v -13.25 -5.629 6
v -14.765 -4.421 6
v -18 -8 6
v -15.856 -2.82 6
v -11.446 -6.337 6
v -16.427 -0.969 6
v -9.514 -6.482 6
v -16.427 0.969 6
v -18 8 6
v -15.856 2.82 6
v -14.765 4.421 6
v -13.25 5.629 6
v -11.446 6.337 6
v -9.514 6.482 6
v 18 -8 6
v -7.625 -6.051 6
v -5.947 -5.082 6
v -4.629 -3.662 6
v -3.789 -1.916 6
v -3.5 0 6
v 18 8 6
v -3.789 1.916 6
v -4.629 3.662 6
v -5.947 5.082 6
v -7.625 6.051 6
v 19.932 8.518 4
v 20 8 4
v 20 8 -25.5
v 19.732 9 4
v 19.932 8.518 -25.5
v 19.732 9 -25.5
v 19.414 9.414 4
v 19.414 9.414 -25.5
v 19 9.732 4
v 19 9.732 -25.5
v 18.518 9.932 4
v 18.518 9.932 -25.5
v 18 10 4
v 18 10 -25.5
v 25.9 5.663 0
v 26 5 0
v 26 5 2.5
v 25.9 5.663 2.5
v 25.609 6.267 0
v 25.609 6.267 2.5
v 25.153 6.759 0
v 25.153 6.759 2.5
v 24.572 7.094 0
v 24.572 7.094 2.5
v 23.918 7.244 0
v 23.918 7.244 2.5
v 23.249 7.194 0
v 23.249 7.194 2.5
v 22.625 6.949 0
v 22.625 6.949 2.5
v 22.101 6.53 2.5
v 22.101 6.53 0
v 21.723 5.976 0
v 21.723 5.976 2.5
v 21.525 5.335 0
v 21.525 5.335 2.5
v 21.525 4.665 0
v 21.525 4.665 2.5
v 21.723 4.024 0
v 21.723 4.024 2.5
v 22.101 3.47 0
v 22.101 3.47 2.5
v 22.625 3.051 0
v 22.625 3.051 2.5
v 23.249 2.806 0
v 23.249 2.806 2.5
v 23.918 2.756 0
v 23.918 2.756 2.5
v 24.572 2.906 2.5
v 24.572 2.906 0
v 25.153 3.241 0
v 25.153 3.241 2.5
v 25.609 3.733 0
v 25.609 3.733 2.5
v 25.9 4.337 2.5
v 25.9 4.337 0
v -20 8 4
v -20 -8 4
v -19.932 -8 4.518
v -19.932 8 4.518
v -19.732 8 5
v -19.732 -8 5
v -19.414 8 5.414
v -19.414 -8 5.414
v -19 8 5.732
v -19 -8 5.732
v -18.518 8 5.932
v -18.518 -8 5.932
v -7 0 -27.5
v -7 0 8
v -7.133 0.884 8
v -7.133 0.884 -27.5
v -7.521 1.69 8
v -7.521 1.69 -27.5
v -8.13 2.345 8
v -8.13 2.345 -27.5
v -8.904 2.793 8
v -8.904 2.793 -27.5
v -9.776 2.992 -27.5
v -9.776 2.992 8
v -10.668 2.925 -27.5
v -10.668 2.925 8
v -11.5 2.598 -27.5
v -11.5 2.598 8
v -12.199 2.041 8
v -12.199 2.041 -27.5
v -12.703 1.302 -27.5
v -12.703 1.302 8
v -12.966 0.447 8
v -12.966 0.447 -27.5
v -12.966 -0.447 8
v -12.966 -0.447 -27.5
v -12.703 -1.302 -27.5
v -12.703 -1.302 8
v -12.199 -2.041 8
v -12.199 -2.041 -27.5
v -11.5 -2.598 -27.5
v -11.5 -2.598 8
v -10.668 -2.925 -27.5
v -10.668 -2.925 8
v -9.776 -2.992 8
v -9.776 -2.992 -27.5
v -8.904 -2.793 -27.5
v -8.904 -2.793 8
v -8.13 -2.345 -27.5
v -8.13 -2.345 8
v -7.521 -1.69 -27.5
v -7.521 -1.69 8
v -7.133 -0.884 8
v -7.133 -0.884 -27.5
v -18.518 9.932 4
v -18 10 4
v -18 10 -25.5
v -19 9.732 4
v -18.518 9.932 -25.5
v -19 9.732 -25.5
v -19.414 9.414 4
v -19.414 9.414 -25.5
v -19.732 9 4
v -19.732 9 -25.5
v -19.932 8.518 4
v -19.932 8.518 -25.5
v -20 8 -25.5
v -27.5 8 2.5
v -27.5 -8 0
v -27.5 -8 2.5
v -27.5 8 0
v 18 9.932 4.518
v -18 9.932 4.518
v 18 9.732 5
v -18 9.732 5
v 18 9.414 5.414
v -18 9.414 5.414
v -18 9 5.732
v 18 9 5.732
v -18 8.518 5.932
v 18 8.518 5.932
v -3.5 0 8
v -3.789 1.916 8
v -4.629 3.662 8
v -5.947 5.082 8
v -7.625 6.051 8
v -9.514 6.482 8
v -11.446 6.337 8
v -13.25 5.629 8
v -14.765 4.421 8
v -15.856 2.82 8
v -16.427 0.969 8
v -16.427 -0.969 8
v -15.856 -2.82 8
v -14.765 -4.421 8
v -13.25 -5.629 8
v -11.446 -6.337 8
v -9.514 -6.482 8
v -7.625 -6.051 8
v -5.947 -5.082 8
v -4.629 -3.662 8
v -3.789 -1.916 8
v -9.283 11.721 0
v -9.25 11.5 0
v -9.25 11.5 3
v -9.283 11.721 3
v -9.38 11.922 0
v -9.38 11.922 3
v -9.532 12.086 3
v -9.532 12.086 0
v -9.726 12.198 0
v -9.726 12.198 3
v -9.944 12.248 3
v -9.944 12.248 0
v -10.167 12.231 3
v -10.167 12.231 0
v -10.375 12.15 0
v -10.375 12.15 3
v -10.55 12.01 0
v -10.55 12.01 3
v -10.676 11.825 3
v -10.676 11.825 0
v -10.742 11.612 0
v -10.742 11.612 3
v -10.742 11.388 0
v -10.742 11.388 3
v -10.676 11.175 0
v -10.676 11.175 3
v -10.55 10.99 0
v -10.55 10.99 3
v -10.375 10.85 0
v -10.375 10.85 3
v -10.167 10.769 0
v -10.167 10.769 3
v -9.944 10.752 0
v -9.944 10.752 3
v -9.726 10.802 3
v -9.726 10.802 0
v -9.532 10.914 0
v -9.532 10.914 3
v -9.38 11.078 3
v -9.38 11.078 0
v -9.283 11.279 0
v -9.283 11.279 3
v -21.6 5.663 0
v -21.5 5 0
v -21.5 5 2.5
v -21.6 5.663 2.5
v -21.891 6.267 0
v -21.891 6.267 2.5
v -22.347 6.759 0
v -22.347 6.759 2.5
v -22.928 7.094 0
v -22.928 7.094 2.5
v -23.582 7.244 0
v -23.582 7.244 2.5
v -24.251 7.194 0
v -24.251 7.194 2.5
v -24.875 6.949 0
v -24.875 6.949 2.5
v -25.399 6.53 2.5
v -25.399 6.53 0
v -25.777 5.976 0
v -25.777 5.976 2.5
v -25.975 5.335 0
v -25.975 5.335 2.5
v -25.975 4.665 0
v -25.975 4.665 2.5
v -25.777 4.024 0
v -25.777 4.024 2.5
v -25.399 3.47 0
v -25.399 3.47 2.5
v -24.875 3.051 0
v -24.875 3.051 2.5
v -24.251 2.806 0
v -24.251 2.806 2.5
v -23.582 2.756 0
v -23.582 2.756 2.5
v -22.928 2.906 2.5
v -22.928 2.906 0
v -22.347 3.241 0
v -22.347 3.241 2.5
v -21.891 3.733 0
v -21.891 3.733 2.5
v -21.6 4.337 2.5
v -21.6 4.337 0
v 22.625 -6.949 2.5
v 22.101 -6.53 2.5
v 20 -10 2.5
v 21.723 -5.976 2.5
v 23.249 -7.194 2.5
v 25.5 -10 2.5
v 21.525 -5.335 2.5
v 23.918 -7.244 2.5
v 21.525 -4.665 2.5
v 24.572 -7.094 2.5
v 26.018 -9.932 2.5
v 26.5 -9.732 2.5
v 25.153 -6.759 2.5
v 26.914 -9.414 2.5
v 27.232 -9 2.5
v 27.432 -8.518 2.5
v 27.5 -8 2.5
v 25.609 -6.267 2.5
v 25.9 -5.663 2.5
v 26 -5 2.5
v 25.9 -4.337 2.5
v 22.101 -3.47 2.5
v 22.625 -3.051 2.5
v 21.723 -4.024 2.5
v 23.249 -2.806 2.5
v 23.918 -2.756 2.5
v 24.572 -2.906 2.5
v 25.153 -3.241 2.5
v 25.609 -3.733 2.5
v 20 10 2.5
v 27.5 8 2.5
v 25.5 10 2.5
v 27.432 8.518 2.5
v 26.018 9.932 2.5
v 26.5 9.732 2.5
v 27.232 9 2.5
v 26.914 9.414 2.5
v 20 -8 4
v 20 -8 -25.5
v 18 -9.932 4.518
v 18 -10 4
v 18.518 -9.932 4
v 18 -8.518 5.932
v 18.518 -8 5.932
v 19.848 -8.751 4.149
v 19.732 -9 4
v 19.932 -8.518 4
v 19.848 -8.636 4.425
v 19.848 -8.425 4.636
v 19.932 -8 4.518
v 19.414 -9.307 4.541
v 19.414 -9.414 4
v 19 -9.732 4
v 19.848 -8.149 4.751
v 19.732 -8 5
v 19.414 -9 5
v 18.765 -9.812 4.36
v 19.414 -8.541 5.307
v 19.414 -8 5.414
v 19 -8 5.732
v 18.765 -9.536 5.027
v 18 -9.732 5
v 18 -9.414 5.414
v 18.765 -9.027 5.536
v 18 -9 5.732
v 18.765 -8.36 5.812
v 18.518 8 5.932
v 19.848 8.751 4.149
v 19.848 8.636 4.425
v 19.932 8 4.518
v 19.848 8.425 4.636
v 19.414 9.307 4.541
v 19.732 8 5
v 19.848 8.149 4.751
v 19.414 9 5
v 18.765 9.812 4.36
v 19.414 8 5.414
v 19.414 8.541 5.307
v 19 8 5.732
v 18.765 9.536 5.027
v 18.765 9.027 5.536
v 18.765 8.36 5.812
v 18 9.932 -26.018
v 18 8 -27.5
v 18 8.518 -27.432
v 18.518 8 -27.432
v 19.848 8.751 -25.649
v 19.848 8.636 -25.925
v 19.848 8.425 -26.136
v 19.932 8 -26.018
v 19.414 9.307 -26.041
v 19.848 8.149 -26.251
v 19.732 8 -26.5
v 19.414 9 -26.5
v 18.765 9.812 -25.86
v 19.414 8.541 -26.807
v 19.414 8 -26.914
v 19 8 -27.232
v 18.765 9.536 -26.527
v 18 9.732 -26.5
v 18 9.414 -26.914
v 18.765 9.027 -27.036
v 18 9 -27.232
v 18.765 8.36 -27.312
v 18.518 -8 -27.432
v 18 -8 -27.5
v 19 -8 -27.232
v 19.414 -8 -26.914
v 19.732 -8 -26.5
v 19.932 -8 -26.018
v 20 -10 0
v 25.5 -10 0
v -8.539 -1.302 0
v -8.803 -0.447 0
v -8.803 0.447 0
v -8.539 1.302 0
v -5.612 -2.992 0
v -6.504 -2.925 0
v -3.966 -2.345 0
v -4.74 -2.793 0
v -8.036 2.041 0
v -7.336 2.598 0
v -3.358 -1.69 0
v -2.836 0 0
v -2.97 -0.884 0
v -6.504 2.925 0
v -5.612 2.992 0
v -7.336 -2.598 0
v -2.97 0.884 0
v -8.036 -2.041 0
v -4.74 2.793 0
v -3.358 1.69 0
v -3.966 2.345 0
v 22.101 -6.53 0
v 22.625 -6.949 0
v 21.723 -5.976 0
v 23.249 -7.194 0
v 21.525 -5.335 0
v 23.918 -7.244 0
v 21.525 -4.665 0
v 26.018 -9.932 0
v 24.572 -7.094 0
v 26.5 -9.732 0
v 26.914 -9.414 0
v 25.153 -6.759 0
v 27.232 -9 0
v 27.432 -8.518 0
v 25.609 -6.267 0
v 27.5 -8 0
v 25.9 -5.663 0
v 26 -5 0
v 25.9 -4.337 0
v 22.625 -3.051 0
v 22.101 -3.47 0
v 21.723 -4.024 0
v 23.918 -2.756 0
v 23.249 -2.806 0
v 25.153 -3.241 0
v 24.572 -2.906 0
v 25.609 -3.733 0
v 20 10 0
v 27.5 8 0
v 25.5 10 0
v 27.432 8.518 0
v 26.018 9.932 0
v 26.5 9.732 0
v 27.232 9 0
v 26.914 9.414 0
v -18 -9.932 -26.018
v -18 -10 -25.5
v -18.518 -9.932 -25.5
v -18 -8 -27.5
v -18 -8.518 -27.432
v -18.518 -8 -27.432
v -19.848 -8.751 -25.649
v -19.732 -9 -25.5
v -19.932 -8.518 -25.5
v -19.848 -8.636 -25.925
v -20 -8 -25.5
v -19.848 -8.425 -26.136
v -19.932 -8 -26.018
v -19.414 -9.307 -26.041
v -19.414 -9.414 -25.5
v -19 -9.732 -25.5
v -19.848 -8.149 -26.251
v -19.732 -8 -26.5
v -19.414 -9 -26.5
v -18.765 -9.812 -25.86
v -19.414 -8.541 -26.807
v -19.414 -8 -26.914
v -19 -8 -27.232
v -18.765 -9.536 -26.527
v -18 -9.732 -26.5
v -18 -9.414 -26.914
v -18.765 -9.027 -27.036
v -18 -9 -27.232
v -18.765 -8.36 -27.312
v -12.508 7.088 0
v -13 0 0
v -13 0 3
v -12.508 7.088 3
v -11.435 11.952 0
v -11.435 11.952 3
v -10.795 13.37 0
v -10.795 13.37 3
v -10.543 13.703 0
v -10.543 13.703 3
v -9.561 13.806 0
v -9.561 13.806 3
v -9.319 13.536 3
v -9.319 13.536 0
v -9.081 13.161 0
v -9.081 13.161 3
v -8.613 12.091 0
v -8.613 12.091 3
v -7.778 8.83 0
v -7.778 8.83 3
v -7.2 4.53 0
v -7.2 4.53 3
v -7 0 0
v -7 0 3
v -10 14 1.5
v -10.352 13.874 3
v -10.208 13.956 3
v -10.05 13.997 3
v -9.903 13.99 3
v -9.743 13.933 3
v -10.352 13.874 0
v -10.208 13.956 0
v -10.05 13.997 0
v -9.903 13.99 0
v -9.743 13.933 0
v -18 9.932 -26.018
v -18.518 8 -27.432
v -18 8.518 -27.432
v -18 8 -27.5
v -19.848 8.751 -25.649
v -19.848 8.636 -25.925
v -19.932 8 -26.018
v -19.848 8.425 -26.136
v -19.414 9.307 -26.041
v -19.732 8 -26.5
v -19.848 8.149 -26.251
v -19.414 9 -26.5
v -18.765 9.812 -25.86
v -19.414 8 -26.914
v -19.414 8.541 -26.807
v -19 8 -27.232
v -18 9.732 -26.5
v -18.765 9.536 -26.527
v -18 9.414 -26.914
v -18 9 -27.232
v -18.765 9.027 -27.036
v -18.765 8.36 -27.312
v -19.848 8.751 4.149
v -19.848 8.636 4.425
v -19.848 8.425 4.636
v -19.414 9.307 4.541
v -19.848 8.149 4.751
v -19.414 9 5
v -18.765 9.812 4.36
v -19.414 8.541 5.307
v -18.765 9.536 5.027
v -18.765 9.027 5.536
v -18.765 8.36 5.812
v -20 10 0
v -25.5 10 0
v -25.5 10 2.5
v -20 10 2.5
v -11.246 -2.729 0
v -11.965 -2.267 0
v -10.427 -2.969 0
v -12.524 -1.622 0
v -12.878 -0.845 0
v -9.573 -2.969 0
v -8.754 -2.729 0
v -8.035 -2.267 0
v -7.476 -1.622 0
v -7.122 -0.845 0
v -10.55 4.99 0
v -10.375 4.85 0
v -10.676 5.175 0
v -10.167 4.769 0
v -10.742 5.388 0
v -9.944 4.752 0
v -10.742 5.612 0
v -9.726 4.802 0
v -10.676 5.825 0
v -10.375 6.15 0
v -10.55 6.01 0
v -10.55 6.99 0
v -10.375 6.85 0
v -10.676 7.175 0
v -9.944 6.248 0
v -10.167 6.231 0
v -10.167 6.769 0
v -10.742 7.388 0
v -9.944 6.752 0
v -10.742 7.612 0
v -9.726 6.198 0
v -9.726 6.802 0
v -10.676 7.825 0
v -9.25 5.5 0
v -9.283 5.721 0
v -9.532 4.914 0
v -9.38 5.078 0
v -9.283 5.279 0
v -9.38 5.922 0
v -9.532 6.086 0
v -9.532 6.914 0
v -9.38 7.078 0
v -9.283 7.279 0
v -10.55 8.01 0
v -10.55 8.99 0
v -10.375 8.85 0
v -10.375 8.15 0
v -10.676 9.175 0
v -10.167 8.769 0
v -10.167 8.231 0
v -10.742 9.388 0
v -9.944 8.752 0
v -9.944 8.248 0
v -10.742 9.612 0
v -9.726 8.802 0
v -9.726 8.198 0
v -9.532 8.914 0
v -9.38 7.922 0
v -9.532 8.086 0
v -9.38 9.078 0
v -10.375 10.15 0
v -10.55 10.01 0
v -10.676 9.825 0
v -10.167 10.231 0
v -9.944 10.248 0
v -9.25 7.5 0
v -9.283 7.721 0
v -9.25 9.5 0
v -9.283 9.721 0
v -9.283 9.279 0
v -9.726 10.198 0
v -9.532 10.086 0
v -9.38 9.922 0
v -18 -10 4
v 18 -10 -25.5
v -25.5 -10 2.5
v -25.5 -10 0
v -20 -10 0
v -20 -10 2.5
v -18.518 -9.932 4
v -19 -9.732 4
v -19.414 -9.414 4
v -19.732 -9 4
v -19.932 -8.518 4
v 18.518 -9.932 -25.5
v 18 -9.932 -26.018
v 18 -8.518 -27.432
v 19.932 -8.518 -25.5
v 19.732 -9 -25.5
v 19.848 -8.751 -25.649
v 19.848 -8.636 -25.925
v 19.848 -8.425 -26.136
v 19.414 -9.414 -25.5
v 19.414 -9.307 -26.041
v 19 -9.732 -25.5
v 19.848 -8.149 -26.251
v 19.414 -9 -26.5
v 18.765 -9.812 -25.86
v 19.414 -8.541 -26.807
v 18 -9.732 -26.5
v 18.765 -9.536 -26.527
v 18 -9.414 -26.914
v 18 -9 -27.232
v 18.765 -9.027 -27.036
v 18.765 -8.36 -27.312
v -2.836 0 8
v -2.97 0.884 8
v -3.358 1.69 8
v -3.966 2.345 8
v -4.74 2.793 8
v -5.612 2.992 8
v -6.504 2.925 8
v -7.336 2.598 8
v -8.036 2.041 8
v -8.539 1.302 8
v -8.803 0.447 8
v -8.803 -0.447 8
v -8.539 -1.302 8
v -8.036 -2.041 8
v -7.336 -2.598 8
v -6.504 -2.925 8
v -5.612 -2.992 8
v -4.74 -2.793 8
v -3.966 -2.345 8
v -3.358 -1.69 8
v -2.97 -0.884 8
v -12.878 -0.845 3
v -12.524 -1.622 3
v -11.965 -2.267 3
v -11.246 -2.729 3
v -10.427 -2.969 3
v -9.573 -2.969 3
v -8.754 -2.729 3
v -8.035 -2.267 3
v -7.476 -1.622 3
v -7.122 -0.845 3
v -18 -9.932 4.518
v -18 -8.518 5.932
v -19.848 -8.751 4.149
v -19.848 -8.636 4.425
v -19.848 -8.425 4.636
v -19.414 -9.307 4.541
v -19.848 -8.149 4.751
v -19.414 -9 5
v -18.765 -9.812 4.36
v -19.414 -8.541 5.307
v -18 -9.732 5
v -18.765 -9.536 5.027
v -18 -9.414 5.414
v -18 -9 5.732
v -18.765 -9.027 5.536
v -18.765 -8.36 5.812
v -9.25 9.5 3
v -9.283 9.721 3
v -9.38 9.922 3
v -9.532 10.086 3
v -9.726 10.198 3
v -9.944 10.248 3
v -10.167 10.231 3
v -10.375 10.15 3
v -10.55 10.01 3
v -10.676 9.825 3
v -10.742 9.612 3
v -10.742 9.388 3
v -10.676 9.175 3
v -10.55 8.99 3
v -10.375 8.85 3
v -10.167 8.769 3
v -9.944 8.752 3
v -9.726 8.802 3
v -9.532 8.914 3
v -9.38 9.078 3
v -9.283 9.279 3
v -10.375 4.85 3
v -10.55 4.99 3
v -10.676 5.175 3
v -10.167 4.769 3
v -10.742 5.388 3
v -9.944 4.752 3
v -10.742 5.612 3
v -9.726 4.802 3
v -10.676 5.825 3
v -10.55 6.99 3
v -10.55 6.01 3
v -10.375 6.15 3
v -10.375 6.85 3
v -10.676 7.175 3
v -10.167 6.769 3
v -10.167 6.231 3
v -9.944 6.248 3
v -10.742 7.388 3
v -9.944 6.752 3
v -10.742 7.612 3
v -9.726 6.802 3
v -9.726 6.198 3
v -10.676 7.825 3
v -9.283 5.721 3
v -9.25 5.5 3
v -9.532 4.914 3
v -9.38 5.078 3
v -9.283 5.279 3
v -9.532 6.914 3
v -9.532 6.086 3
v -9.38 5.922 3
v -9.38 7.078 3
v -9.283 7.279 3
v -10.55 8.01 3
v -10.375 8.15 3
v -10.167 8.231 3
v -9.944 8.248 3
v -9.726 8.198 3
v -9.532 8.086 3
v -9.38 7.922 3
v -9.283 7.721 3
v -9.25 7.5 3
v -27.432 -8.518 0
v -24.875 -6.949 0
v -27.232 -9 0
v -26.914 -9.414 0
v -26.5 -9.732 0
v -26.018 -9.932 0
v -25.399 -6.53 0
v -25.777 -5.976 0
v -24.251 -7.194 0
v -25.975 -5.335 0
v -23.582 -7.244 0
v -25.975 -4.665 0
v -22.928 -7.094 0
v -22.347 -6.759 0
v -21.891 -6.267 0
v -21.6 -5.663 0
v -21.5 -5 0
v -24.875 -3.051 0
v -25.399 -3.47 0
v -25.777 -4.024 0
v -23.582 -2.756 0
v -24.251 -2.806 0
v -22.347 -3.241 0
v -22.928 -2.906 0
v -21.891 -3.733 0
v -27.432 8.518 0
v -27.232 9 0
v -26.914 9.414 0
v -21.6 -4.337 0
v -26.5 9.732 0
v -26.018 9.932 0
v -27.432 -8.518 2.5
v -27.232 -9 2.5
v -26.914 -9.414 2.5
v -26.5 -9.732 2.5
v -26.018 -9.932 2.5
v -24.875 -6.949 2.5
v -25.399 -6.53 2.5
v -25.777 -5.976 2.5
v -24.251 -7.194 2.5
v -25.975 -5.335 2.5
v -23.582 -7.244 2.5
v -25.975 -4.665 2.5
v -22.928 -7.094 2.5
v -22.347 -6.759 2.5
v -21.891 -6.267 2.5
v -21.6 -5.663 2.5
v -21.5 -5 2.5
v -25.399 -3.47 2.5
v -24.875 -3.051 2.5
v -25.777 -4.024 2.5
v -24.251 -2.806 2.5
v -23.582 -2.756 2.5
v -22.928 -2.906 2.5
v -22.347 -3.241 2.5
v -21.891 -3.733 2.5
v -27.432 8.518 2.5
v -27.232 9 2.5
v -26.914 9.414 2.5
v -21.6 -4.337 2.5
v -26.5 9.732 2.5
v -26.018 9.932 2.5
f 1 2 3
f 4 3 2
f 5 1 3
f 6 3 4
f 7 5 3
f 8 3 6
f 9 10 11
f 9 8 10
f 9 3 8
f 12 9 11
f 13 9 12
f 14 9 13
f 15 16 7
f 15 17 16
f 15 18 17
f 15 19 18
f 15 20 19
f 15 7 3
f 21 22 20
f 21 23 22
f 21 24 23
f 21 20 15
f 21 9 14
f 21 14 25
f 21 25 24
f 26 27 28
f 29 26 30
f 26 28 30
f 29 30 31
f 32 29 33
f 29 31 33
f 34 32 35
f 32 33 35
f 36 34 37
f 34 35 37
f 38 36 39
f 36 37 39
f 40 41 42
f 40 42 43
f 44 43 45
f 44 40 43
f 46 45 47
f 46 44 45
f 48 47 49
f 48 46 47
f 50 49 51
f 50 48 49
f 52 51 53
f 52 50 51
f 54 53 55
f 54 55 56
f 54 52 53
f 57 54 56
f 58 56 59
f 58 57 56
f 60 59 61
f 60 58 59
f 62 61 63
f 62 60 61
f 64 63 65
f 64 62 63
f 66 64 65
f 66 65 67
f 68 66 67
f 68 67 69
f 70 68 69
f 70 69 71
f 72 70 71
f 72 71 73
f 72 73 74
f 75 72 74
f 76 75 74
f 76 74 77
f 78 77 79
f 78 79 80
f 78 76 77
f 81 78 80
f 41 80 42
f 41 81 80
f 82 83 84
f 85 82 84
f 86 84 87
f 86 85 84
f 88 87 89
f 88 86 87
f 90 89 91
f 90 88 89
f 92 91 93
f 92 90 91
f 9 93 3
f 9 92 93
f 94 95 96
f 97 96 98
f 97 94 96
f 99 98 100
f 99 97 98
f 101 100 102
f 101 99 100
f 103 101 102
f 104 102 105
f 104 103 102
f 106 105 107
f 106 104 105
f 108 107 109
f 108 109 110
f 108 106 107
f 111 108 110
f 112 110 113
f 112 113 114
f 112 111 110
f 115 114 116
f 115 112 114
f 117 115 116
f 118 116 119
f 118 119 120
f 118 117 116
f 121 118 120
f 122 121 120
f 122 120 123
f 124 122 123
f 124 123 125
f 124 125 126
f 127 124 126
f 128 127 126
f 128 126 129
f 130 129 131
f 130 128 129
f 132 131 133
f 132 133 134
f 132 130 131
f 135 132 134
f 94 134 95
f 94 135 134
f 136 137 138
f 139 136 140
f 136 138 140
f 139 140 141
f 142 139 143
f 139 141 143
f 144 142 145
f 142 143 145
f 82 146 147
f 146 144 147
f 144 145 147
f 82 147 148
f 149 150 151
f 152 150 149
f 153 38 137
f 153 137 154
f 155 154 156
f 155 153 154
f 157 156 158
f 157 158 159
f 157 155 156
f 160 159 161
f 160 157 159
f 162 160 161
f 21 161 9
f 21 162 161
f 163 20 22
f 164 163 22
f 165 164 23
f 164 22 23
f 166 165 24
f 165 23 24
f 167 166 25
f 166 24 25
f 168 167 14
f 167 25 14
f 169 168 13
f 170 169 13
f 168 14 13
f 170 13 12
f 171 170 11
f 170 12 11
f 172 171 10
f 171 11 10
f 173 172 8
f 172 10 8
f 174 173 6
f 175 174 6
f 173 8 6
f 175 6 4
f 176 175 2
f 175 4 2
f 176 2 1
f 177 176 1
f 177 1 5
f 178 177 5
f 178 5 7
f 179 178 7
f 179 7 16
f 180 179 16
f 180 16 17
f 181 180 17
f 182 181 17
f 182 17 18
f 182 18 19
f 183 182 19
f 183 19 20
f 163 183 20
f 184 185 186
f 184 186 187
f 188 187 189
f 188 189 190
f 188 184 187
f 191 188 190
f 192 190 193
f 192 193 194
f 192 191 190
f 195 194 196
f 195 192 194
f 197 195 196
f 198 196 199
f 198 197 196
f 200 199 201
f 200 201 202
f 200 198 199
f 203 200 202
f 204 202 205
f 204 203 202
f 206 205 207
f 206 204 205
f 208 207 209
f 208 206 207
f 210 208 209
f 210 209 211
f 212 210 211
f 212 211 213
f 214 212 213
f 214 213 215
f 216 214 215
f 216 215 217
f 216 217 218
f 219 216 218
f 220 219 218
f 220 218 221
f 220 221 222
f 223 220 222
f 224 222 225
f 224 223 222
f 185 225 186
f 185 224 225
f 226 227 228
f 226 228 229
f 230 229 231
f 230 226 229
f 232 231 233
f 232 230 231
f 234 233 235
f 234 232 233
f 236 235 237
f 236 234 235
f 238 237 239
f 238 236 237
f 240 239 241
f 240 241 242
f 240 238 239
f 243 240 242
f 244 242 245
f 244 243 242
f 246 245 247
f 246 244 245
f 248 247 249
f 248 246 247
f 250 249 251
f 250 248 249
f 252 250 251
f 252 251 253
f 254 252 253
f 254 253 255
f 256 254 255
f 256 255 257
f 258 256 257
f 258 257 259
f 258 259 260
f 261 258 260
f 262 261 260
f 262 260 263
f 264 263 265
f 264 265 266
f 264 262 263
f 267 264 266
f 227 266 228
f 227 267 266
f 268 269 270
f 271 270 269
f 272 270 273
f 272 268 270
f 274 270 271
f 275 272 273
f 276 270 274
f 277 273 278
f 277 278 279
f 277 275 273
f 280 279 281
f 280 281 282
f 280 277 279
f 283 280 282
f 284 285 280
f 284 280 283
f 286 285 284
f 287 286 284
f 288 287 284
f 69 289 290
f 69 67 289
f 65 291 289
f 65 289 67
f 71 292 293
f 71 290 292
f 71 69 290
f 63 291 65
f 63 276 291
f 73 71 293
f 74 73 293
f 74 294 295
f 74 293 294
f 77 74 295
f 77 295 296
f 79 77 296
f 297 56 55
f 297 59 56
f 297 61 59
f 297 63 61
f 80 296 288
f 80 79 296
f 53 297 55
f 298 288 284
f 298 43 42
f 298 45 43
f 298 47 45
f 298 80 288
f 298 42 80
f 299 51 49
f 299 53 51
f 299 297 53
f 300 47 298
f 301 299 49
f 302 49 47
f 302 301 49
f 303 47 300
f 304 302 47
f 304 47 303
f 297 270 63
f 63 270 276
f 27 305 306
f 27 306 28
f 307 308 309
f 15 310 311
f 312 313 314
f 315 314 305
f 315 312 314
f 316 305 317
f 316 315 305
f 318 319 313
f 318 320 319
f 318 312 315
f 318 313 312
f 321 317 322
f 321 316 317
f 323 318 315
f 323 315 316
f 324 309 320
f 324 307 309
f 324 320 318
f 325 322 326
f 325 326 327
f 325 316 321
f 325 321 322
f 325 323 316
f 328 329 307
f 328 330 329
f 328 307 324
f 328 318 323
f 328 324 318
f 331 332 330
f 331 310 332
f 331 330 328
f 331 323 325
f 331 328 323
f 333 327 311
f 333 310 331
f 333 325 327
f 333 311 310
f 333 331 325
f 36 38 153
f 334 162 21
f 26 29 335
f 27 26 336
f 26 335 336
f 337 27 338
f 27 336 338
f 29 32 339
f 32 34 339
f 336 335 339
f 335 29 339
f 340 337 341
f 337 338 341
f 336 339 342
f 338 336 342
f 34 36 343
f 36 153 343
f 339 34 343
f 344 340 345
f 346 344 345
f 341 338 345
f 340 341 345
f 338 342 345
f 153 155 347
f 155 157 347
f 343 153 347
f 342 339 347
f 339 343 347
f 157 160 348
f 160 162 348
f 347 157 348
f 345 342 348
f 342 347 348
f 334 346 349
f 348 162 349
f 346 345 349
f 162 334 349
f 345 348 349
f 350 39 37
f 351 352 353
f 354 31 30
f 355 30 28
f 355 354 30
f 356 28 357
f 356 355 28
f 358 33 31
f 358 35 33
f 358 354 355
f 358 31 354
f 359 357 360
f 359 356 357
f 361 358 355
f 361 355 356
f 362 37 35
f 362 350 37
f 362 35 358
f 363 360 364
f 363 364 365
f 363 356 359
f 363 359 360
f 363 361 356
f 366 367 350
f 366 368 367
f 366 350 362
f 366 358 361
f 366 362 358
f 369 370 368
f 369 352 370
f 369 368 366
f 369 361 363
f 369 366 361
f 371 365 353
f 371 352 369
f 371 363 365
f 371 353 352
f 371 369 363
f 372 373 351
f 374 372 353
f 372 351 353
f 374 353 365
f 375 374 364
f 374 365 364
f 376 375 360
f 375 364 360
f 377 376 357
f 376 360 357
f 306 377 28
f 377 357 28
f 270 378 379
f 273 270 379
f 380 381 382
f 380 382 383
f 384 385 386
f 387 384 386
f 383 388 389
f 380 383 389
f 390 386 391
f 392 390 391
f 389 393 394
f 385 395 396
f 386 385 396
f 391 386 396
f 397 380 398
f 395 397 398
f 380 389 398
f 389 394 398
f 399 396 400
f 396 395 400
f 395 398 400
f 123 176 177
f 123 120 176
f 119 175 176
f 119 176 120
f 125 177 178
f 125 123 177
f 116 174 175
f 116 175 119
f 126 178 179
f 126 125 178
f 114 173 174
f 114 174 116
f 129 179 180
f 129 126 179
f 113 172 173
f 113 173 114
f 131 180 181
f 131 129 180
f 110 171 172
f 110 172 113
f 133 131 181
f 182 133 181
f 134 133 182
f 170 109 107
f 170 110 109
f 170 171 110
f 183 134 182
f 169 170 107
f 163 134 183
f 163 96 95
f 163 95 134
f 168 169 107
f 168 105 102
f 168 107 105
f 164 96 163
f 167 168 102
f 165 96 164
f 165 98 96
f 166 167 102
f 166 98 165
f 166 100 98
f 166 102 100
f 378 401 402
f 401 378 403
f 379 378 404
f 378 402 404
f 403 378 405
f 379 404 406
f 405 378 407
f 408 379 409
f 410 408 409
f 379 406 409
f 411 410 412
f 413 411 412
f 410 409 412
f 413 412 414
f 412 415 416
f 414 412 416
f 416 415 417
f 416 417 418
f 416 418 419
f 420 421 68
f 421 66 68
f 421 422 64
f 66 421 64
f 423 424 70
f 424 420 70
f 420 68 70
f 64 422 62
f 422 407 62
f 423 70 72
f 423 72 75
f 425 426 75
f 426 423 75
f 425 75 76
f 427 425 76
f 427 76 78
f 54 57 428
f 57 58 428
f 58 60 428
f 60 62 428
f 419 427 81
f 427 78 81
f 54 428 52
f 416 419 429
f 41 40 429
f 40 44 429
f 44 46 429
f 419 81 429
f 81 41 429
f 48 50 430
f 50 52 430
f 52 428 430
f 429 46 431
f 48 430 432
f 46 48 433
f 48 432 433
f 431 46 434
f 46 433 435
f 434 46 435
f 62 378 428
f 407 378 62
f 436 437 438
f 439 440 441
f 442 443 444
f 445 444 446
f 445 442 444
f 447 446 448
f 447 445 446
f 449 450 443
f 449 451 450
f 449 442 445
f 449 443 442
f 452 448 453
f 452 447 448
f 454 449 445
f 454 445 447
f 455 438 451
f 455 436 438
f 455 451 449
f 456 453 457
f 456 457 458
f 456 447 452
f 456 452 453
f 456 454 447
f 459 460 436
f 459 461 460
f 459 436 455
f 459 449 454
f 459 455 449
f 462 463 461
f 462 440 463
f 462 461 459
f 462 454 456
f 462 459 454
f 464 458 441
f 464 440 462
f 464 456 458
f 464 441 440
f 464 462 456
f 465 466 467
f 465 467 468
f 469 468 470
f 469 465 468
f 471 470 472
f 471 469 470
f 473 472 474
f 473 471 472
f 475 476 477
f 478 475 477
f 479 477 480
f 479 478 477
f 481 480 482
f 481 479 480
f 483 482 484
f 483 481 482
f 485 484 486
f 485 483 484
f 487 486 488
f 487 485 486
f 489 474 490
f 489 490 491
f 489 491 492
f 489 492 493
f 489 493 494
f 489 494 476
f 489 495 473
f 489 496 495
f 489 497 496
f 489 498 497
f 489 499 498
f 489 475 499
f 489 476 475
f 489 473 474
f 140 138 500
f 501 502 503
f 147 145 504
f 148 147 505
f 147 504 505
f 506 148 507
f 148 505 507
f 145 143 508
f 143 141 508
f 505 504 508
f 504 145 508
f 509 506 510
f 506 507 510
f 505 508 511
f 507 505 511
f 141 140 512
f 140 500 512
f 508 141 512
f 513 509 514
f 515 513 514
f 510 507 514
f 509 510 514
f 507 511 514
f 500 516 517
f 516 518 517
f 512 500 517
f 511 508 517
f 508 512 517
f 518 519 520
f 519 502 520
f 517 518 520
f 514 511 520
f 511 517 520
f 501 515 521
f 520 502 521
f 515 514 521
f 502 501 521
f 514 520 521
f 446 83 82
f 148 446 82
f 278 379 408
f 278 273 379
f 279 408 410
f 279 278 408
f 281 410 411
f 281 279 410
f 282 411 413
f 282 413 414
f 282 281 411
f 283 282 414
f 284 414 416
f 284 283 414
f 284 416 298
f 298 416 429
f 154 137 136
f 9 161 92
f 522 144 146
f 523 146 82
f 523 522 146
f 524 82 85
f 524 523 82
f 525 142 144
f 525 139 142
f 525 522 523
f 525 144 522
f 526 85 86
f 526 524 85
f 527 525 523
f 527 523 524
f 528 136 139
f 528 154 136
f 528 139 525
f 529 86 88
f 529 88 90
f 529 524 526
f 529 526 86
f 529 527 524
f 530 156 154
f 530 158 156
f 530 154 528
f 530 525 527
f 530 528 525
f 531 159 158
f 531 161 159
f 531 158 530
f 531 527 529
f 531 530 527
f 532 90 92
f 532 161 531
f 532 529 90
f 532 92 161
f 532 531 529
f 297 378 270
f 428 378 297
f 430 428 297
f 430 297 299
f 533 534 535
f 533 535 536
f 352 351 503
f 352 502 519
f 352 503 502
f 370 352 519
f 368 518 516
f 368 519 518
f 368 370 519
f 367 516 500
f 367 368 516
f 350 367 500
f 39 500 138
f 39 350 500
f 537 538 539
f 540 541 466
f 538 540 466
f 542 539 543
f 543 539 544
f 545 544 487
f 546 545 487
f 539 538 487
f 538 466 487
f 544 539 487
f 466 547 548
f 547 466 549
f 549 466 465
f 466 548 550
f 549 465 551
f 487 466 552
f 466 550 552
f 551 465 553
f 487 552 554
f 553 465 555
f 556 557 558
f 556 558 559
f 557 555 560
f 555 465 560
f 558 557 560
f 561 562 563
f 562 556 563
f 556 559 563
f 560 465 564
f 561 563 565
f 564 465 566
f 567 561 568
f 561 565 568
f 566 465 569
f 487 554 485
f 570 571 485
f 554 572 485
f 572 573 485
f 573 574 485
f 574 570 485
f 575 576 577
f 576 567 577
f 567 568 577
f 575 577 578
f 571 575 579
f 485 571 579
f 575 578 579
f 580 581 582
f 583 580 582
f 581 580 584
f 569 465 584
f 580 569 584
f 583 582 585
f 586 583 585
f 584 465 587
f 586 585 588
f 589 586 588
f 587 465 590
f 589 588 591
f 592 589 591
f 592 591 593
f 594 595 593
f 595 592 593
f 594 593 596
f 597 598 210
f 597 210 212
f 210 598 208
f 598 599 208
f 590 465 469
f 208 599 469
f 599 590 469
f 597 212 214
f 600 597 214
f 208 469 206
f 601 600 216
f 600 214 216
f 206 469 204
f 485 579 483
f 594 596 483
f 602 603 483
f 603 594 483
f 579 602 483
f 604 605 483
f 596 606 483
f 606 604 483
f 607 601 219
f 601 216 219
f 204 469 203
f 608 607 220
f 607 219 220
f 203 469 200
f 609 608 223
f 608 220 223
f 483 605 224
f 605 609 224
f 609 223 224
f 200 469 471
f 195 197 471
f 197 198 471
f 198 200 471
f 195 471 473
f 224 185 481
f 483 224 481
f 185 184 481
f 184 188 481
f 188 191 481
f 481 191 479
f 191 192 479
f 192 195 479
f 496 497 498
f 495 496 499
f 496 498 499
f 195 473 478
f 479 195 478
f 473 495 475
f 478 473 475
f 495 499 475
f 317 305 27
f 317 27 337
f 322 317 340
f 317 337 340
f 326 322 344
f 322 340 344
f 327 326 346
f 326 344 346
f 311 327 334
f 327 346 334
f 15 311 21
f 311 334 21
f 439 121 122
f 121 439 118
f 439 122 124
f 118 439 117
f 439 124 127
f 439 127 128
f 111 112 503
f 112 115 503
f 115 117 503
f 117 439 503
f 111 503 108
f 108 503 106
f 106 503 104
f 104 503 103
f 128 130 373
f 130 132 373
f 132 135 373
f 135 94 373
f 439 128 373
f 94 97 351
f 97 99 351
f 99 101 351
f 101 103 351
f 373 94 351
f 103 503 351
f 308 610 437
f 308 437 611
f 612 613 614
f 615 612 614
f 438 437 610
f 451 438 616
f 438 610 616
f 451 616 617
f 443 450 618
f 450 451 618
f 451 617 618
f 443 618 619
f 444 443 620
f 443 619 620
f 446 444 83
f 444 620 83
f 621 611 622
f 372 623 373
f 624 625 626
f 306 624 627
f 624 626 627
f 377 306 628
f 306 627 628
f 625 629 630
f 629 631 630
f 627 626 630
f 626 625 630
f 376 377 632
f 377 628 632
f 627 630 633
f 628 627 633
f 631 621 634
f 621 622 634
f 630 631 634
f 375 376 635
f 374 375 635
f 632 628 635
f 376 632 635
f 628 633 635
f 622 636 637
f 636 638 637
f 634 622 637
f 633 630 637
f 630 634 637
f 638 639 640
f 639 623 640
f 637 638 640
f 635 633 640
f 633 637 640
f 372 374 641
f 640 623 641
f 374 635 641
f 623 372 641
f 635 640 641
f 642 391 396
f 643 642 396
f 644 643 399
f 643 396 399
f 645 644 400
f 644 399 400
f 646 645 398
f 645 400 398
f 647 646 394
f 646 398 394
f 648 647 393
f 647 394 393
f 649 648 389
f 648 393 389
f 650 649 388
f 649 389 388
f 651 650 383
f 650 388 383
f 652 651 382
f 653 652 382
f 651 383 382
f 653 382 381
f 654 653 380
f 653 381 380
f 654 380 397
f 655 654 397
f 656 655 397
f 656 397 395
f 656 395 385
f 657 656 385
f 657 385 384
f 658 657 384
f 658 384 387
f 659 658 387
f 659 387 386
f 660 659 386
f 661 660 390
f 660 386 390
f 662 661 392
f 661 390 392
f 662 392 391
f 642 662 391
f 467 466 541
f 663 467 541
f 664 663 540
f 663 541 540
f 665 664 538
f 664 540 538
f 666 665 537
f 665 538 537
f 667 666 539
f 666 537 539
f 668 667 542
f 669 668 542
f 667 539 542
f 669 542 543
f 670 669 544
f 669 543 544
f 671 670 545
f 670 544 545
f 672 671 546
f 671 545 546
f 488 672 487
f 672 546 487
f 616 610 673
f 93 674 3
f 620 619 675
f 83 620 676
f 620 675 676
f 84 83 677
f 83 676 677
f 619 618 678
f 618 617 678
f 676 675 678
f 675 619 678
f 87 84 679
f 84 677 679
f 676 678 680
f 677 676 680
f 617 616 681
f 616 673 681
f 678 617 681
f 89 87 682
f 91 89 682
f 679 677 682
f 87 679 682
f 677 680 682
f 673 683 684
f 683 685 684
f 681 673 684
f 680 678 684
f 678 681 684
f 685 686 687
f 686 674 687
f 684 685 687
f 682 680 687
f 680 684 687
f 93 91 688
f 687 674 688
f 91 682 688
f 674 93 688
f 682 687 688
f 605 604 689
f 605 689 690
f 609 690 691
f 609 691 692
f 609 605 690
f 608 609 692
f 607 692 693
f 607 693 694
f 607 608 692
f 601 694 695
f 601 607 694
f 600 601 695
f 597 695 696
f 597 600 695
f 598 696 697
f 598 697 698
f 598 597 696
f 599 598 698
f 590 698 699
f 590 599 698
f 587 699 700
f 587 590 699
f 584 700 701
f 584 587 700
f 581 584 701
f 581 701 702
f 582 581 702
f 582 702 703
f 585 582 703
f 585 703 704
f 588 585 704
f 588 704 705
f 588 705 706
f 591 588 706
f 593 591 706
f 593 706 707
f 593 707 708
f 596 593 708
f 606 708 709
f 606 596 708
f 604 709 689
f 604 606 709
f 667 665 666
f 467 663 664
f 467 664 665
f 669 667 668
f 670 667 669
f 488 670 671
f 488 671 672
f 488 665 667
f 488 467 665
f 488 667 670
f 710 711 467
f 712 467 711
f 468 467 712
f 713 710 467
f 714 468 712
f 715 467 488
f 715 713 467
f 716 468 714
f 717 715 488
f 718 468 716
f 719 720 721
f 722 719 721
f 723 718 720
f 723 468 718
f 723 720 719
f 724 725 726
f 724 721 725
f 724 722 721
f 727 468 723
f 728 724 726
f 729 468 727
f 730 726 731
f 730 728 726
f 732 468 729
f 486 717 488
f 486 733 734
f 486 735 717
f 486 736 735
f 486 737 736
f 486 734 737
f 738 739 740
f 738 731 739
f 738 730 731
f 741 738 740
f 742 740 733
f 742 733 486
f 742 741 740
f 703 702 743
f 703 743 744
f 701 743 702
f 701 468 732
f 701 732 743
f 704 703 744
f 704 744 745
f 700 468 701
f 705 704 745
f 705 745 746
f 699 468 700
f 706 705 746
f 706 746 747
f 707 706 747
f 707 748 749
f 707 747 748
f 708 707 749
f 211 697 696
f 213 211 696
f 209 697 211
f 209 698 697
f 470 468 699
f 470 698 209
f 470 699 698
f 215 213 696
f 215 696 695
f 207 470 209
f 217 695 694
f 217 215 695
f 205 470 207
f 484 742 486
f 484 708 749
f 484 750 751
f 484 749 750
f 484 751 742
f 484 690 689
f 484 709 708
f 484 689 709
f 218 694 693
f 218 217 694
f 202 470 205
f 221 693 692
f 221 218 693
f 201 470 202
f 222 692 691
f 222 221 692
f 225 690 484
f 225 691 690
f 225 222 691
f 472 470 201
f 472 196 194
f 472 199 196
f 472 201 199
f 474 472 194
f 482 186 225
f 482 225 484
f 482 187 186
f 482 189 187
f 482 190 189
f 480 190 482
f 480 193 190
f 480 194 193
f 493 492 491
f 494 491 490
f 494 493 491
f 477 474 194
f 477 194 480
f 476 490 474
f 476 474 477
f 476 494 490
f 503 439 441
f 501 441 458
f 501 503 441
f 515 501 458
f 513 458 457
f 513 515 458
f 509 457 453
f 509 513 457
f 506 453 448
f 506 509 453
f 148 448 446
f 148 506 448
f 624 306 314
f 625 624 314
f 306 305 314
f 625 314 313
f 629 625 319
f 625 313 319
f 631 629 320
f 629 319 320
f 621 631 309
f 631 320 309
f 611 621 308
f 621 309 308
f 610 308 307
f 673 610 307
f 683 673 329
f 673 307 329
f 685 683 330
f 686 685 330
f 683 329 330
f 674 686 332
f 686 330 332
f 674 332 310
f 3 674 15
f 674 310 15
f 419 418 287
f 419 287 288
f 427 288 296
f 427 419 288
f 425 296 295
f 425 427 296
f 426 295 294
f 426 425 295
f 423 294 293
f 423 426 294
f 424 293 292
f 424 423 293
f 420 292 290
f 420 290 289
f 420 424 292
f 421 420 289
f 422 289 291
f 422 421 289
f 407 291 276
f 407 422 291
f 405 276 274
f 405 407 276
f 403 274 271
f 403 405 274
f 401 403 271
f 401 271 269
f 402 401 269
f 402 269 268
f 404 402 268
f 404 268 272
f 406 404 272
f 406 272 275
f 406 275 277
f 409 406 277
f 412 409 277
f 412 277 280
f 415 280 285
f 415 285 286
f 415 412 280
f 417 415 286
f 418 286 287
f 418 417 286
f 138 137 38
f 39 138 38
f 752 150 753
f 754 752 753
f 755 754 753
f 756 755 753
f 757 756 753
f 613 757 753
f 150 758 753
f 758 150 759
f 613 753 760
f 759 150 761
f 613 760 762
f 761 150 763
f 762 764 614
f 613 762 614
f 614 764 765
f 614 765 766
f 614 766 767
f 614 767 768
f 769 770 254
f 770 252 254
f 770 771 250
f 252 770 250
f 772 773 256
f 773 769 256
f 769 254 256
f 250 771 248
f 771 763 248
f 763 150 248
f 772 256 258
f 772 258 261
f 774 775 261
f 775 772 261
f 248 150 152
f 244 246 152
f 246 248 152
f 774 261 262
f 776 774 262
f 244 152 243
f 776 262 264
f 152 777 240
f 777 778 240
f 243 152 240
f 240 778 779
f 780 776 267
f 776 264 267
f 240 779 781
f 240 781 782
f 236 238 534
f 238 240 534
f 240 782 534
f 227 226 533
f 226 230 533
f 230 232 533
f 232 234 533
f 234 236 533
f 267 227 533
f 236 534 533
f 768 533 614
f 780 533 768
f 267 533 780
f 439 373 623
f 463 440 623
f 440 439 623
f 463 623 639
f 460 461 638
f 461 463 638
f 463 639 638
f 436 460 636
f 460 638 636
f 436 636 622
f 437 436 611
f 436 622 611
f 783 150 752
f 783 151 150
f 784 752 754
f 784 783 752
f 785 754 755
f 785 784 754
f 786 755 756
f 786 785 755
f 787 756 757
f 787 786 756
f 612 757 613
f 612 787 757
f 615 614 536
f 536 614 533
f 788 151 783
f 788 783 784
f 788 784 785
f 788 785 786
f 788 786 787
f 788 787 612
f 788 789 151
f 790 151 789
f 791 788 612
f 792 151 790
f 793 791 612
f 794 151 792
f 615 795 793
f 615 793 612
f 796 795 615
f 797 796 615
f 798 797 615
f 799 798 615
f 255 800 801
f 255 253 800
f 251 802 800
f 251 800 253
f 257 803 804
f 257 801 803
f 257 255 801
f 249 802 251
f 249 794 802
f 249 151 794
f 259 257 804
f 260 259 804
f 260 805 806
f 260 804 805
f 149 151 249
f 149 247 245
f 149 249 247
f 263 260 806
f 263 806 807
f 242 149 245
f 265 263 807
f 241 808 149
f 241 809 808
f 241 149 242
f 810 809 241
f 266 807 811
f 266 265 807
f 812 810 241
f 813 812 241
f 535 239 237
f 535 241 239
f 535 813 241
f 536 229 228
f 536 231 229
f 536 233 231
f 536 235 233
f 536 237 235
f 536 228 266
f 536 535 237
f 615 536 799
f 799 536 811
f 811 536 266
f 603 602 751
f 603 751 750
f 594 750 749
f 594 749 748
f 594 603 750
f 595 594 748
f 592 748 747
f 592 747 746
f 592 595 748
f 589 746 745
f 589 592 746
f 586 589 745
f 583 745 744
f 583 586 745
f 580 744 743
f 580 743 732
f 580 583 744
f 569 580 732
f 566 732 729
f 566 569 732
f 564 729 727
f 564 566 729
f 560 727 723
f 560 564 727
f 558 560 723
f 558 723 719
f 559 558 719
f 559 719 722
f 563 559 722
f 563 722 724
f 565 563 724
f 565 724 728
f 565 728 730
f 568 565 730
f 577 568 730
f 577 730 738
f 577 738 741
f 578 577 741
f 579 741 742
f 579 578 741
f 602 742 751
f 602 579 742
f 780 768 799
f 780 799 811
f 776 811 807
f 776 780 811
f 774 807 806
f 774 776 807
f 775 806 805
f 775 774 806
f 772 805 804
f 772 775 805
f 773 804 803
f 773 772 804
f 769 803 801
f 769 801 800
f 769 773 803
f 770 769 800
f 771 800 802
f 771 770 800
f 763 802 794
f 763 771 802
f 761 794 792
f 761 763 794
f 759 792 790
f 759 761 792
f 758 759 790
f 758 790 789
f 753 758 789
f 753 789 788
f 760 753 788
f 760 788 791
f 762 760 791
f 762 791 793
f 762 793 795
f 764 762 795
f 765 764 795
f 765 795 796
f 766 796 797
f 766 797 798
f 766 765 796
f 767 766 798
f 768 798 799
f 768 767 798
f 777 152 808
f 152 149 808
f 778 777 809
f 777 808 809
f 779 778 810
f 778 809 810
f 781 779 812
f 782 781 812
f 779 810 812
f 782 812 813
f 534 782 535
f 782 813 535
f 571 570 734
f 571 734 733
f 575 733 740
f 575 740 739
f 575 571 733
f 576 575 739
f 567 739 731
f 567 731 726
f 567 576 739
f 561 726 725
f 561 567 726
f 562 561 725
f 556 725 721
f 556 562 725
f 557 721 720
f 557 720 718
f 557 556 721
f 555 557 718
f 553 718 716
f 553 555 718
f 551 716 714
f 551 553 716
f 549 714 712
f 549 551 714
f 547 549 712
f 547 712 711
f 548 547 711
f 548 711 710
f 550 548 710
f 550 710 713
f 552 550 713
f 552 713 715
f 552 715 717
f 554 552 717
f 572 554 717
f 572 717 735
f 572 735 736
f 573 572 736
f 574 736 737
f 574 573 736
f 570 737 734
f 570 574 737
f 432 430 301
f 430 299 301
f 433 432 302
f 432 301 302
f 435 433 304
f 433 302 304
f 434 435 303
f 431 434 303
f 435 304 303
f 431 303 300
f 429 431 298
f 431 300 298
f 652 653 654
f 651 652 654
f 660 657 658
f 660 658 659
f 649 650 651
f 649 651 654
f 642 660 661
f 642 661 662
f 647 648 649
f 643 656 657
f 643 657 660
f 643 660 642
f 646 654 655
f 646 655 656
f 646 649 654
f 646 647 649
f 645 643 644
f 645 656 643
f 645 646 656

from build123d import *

# Parameters (mm, degrees)
F0_W      = 7.5
F0_H      = 20
F0_R      = 2.25
F1_DEPTH  = 2.5
F0_W_2    = 40
F0_R_2    = 6.5
F2_DEPTH  = 6
F0_R_3    = 3
F3_DEPTH  = 27.5
F4_DEPTH  = 8
F5_R      = 2
F5_2_R    = 2
F5_3_R    = 2
F7_R      = 0.75
F8_DEPTH  = 3
F9_DEPTH  = 3
F11_R     = 3
F12_DEPTH = 8


# Not quite as in the source:
# - a feature of the source that left no trace in its solid (it failed there, or was rolled back) is left out


with BuildPart() as f1:
    # F0 (on Top) → F1 (new body)
    with BuildSketch(Plane.XY):
        with Locations((23.75, 0)):
            Rectangle(F0_W, F0_H)
        with Locations((23.75, -5)):
            Circle(F0_R, mode=Mode.SUBTRACT)
        with Locations((23.75, 5)):
            Circle(F0_R, mode=Mode.SUBTRACT)
    extrude(amount=F1_DEPTH)

    # F5
    f5_edges = [f1.edges().sort_by_distance(p)[0] for p in [
        (27.5, -10, 1.25),
        (27.5, 10, 1.25),
    ]]
    fillet(f5_edges, radius=F5_R)


with BuildPart() as f1b:
    # F0 (on Top) → F1, piece 2 (new body)
    with BuildSketch(Plane.XY):
        with Locations((-23.75, 0)):
            Rectangle(F0_W, F0_H)
        with Locations((-23.75, -5)):
            Circle(F0_R, mode=Mode.SUBTRACT)
        with Locations((-23.75, 5)):
            Circle(F0_R, mode=Mode.SUBTRACT)
    extrude(amount=F1_DEPTH)

    # F5#2
    f5_2_edges = [f1b.edges().sort_by_distance(p)[0] for p in [
        (-27.5, -10, 1.25),
        (-27.5, 10, 1.25),
    ]]
    fillet(f5_2_edges, radius=F5_2_R)


with BuildPart() as f2:
    # F0 (on Top) → F2 (new body)
    with BuildSketch(Plane.XY):
        Rectangle(F0_W_2, F0_H)
        with Locations((-10, 0)):
            Circle(F0_R_2, mode=Mode.SUBTRACT)
    extrude(amount=F2_DEPTH)

    # F0 (on Top) → F3 (join)
    with BuildSketch(Plane.XY):
        Rectangle(F0_W_2, F0_H)
        with Locations((-10, 0)):
            Circle(F0_R_2, mode=Mode.SUBTRACT)
        with Locations((-10, 0)):
            Circle(F0_R_2)
        with Locations((-10, 0)):
            Circle(F0_R_3, mode=Mode.SUBTRACT)
    extrude(amount=-F3_DEPTH)

    # F0 (on Top) → F4 (join)
    with BuildSketch(Plane.XY):
        with Locations((-10, 0)):
            Circle(F0_R_2)
        with Locations((-10, 0)):
            Circle(F0_R_3, mode=Mode.SUBTRACT)
    extrude(amount=F4_DEPTH)

    # F5#3
    f5_3_edges = [f2.edges().sort_by_distance(p)[0] for p in [
        (0, -10, 6),
        (0, 10, 6),
        (0, 10, -27.5),
        (0, -10, -27.5),
        (-20, 10, -10.75),
        (-20, -10, -10.75),
        (20, -10, -10.75),
        (20, 10, -10.75),
        (20, 0, -27.5),
        (20, 0, 6),
        (-20, 0, 6),
        (-20, 0, -27.5),
    ]]
    fillet(f5_3_edges, radius=F5_3_R)


with BuildPart() as f8:
    # F7 (on Top) → F8 (new body)
    with BuildSketch(Plane.XY):
        with BuildLine():
            ThreePointArc((-13, 0), (-10, -3), (-7, 0))
            ThreePointArc((-7, 0), (-10, 3), (-13, 0))
        make_face()
        with BuildLine():
            ThreePointArc((-13, 0), (-10, 3), (-7, 0))
            add(Edge.make_bspline(
                [(-13, 0), (-13, 7), (-10, 21), (-7, 7), (-7, 0)],
                knots=[0, 0, 0, 0, 0.5, 1, 1, 1, 1], degree=3))
        make_face()
        with Locations((-10, 5.5)):
            Circle(F7_R, mode=Mode.SUBTRACT)
        with Locations((-10, 7.5)):
            Circle(F7_R, mode=Mode.SUBTRACT)
        with Locations((-10, 9.5)):
            Circle(F7_R, mode=Mode.SUBTRACT)
        with Locations((-10, 11.5)):
            Circle(F7_R, mode=Mode.SUBTRACT)
    extrude(amount=F8_DEPTH)


with BuildPart() as f9:
    # F7 (on Top) → F9 (new body)
    with BuildSketch(Plane.XY):
        with BuildLine():
            ThreePointArc((-13, 0), (-10, -3), (-7, 0))
            ThreePointArc((-7, 0), (-10, 3), (-13, 0))
        make_face()
        with BuildLine():
            ThreePointArc((-13, 0), (-10, 3), (-7, 0))
            add(Edge.make_bspline(
                [(-13, 0), (-13, 7), (-10, 21), (-7, 7), (-7, 0)],
                knots=[0, 0, 0, 0, 0.5, 1, 1, 1, 1], degree=3))
        make_face()
        with Locations((-10, 5.5)):
            Circle(F7_R, mode=Mode.SUBTRACT)
        with Locations((-10, 7.5)):
            Circle(F7_R, mode=Mode.SUBTRACT)
        with Locations((-10, 9.5)):
            Circle(F7_R, mode=Mode.SUBTRACT)
        with Locations((-10, 11.5)):
            Circle(F7_R, mode=Mode.SUBTRACT)
    extrude(amount=F9_DEPTH)


with BuildPart() as f12:
    # F11 (on Top) → F12 (new body)
    with BuildSketch(Plane.XY):
        with Locations((-5.8363600008, 0)):
            Circle(F11_R)
    extrude(amount=F12_DEPTH)


solid = Compound([f1.part, f1b.part, f2.part, f8.part, f12.part])
